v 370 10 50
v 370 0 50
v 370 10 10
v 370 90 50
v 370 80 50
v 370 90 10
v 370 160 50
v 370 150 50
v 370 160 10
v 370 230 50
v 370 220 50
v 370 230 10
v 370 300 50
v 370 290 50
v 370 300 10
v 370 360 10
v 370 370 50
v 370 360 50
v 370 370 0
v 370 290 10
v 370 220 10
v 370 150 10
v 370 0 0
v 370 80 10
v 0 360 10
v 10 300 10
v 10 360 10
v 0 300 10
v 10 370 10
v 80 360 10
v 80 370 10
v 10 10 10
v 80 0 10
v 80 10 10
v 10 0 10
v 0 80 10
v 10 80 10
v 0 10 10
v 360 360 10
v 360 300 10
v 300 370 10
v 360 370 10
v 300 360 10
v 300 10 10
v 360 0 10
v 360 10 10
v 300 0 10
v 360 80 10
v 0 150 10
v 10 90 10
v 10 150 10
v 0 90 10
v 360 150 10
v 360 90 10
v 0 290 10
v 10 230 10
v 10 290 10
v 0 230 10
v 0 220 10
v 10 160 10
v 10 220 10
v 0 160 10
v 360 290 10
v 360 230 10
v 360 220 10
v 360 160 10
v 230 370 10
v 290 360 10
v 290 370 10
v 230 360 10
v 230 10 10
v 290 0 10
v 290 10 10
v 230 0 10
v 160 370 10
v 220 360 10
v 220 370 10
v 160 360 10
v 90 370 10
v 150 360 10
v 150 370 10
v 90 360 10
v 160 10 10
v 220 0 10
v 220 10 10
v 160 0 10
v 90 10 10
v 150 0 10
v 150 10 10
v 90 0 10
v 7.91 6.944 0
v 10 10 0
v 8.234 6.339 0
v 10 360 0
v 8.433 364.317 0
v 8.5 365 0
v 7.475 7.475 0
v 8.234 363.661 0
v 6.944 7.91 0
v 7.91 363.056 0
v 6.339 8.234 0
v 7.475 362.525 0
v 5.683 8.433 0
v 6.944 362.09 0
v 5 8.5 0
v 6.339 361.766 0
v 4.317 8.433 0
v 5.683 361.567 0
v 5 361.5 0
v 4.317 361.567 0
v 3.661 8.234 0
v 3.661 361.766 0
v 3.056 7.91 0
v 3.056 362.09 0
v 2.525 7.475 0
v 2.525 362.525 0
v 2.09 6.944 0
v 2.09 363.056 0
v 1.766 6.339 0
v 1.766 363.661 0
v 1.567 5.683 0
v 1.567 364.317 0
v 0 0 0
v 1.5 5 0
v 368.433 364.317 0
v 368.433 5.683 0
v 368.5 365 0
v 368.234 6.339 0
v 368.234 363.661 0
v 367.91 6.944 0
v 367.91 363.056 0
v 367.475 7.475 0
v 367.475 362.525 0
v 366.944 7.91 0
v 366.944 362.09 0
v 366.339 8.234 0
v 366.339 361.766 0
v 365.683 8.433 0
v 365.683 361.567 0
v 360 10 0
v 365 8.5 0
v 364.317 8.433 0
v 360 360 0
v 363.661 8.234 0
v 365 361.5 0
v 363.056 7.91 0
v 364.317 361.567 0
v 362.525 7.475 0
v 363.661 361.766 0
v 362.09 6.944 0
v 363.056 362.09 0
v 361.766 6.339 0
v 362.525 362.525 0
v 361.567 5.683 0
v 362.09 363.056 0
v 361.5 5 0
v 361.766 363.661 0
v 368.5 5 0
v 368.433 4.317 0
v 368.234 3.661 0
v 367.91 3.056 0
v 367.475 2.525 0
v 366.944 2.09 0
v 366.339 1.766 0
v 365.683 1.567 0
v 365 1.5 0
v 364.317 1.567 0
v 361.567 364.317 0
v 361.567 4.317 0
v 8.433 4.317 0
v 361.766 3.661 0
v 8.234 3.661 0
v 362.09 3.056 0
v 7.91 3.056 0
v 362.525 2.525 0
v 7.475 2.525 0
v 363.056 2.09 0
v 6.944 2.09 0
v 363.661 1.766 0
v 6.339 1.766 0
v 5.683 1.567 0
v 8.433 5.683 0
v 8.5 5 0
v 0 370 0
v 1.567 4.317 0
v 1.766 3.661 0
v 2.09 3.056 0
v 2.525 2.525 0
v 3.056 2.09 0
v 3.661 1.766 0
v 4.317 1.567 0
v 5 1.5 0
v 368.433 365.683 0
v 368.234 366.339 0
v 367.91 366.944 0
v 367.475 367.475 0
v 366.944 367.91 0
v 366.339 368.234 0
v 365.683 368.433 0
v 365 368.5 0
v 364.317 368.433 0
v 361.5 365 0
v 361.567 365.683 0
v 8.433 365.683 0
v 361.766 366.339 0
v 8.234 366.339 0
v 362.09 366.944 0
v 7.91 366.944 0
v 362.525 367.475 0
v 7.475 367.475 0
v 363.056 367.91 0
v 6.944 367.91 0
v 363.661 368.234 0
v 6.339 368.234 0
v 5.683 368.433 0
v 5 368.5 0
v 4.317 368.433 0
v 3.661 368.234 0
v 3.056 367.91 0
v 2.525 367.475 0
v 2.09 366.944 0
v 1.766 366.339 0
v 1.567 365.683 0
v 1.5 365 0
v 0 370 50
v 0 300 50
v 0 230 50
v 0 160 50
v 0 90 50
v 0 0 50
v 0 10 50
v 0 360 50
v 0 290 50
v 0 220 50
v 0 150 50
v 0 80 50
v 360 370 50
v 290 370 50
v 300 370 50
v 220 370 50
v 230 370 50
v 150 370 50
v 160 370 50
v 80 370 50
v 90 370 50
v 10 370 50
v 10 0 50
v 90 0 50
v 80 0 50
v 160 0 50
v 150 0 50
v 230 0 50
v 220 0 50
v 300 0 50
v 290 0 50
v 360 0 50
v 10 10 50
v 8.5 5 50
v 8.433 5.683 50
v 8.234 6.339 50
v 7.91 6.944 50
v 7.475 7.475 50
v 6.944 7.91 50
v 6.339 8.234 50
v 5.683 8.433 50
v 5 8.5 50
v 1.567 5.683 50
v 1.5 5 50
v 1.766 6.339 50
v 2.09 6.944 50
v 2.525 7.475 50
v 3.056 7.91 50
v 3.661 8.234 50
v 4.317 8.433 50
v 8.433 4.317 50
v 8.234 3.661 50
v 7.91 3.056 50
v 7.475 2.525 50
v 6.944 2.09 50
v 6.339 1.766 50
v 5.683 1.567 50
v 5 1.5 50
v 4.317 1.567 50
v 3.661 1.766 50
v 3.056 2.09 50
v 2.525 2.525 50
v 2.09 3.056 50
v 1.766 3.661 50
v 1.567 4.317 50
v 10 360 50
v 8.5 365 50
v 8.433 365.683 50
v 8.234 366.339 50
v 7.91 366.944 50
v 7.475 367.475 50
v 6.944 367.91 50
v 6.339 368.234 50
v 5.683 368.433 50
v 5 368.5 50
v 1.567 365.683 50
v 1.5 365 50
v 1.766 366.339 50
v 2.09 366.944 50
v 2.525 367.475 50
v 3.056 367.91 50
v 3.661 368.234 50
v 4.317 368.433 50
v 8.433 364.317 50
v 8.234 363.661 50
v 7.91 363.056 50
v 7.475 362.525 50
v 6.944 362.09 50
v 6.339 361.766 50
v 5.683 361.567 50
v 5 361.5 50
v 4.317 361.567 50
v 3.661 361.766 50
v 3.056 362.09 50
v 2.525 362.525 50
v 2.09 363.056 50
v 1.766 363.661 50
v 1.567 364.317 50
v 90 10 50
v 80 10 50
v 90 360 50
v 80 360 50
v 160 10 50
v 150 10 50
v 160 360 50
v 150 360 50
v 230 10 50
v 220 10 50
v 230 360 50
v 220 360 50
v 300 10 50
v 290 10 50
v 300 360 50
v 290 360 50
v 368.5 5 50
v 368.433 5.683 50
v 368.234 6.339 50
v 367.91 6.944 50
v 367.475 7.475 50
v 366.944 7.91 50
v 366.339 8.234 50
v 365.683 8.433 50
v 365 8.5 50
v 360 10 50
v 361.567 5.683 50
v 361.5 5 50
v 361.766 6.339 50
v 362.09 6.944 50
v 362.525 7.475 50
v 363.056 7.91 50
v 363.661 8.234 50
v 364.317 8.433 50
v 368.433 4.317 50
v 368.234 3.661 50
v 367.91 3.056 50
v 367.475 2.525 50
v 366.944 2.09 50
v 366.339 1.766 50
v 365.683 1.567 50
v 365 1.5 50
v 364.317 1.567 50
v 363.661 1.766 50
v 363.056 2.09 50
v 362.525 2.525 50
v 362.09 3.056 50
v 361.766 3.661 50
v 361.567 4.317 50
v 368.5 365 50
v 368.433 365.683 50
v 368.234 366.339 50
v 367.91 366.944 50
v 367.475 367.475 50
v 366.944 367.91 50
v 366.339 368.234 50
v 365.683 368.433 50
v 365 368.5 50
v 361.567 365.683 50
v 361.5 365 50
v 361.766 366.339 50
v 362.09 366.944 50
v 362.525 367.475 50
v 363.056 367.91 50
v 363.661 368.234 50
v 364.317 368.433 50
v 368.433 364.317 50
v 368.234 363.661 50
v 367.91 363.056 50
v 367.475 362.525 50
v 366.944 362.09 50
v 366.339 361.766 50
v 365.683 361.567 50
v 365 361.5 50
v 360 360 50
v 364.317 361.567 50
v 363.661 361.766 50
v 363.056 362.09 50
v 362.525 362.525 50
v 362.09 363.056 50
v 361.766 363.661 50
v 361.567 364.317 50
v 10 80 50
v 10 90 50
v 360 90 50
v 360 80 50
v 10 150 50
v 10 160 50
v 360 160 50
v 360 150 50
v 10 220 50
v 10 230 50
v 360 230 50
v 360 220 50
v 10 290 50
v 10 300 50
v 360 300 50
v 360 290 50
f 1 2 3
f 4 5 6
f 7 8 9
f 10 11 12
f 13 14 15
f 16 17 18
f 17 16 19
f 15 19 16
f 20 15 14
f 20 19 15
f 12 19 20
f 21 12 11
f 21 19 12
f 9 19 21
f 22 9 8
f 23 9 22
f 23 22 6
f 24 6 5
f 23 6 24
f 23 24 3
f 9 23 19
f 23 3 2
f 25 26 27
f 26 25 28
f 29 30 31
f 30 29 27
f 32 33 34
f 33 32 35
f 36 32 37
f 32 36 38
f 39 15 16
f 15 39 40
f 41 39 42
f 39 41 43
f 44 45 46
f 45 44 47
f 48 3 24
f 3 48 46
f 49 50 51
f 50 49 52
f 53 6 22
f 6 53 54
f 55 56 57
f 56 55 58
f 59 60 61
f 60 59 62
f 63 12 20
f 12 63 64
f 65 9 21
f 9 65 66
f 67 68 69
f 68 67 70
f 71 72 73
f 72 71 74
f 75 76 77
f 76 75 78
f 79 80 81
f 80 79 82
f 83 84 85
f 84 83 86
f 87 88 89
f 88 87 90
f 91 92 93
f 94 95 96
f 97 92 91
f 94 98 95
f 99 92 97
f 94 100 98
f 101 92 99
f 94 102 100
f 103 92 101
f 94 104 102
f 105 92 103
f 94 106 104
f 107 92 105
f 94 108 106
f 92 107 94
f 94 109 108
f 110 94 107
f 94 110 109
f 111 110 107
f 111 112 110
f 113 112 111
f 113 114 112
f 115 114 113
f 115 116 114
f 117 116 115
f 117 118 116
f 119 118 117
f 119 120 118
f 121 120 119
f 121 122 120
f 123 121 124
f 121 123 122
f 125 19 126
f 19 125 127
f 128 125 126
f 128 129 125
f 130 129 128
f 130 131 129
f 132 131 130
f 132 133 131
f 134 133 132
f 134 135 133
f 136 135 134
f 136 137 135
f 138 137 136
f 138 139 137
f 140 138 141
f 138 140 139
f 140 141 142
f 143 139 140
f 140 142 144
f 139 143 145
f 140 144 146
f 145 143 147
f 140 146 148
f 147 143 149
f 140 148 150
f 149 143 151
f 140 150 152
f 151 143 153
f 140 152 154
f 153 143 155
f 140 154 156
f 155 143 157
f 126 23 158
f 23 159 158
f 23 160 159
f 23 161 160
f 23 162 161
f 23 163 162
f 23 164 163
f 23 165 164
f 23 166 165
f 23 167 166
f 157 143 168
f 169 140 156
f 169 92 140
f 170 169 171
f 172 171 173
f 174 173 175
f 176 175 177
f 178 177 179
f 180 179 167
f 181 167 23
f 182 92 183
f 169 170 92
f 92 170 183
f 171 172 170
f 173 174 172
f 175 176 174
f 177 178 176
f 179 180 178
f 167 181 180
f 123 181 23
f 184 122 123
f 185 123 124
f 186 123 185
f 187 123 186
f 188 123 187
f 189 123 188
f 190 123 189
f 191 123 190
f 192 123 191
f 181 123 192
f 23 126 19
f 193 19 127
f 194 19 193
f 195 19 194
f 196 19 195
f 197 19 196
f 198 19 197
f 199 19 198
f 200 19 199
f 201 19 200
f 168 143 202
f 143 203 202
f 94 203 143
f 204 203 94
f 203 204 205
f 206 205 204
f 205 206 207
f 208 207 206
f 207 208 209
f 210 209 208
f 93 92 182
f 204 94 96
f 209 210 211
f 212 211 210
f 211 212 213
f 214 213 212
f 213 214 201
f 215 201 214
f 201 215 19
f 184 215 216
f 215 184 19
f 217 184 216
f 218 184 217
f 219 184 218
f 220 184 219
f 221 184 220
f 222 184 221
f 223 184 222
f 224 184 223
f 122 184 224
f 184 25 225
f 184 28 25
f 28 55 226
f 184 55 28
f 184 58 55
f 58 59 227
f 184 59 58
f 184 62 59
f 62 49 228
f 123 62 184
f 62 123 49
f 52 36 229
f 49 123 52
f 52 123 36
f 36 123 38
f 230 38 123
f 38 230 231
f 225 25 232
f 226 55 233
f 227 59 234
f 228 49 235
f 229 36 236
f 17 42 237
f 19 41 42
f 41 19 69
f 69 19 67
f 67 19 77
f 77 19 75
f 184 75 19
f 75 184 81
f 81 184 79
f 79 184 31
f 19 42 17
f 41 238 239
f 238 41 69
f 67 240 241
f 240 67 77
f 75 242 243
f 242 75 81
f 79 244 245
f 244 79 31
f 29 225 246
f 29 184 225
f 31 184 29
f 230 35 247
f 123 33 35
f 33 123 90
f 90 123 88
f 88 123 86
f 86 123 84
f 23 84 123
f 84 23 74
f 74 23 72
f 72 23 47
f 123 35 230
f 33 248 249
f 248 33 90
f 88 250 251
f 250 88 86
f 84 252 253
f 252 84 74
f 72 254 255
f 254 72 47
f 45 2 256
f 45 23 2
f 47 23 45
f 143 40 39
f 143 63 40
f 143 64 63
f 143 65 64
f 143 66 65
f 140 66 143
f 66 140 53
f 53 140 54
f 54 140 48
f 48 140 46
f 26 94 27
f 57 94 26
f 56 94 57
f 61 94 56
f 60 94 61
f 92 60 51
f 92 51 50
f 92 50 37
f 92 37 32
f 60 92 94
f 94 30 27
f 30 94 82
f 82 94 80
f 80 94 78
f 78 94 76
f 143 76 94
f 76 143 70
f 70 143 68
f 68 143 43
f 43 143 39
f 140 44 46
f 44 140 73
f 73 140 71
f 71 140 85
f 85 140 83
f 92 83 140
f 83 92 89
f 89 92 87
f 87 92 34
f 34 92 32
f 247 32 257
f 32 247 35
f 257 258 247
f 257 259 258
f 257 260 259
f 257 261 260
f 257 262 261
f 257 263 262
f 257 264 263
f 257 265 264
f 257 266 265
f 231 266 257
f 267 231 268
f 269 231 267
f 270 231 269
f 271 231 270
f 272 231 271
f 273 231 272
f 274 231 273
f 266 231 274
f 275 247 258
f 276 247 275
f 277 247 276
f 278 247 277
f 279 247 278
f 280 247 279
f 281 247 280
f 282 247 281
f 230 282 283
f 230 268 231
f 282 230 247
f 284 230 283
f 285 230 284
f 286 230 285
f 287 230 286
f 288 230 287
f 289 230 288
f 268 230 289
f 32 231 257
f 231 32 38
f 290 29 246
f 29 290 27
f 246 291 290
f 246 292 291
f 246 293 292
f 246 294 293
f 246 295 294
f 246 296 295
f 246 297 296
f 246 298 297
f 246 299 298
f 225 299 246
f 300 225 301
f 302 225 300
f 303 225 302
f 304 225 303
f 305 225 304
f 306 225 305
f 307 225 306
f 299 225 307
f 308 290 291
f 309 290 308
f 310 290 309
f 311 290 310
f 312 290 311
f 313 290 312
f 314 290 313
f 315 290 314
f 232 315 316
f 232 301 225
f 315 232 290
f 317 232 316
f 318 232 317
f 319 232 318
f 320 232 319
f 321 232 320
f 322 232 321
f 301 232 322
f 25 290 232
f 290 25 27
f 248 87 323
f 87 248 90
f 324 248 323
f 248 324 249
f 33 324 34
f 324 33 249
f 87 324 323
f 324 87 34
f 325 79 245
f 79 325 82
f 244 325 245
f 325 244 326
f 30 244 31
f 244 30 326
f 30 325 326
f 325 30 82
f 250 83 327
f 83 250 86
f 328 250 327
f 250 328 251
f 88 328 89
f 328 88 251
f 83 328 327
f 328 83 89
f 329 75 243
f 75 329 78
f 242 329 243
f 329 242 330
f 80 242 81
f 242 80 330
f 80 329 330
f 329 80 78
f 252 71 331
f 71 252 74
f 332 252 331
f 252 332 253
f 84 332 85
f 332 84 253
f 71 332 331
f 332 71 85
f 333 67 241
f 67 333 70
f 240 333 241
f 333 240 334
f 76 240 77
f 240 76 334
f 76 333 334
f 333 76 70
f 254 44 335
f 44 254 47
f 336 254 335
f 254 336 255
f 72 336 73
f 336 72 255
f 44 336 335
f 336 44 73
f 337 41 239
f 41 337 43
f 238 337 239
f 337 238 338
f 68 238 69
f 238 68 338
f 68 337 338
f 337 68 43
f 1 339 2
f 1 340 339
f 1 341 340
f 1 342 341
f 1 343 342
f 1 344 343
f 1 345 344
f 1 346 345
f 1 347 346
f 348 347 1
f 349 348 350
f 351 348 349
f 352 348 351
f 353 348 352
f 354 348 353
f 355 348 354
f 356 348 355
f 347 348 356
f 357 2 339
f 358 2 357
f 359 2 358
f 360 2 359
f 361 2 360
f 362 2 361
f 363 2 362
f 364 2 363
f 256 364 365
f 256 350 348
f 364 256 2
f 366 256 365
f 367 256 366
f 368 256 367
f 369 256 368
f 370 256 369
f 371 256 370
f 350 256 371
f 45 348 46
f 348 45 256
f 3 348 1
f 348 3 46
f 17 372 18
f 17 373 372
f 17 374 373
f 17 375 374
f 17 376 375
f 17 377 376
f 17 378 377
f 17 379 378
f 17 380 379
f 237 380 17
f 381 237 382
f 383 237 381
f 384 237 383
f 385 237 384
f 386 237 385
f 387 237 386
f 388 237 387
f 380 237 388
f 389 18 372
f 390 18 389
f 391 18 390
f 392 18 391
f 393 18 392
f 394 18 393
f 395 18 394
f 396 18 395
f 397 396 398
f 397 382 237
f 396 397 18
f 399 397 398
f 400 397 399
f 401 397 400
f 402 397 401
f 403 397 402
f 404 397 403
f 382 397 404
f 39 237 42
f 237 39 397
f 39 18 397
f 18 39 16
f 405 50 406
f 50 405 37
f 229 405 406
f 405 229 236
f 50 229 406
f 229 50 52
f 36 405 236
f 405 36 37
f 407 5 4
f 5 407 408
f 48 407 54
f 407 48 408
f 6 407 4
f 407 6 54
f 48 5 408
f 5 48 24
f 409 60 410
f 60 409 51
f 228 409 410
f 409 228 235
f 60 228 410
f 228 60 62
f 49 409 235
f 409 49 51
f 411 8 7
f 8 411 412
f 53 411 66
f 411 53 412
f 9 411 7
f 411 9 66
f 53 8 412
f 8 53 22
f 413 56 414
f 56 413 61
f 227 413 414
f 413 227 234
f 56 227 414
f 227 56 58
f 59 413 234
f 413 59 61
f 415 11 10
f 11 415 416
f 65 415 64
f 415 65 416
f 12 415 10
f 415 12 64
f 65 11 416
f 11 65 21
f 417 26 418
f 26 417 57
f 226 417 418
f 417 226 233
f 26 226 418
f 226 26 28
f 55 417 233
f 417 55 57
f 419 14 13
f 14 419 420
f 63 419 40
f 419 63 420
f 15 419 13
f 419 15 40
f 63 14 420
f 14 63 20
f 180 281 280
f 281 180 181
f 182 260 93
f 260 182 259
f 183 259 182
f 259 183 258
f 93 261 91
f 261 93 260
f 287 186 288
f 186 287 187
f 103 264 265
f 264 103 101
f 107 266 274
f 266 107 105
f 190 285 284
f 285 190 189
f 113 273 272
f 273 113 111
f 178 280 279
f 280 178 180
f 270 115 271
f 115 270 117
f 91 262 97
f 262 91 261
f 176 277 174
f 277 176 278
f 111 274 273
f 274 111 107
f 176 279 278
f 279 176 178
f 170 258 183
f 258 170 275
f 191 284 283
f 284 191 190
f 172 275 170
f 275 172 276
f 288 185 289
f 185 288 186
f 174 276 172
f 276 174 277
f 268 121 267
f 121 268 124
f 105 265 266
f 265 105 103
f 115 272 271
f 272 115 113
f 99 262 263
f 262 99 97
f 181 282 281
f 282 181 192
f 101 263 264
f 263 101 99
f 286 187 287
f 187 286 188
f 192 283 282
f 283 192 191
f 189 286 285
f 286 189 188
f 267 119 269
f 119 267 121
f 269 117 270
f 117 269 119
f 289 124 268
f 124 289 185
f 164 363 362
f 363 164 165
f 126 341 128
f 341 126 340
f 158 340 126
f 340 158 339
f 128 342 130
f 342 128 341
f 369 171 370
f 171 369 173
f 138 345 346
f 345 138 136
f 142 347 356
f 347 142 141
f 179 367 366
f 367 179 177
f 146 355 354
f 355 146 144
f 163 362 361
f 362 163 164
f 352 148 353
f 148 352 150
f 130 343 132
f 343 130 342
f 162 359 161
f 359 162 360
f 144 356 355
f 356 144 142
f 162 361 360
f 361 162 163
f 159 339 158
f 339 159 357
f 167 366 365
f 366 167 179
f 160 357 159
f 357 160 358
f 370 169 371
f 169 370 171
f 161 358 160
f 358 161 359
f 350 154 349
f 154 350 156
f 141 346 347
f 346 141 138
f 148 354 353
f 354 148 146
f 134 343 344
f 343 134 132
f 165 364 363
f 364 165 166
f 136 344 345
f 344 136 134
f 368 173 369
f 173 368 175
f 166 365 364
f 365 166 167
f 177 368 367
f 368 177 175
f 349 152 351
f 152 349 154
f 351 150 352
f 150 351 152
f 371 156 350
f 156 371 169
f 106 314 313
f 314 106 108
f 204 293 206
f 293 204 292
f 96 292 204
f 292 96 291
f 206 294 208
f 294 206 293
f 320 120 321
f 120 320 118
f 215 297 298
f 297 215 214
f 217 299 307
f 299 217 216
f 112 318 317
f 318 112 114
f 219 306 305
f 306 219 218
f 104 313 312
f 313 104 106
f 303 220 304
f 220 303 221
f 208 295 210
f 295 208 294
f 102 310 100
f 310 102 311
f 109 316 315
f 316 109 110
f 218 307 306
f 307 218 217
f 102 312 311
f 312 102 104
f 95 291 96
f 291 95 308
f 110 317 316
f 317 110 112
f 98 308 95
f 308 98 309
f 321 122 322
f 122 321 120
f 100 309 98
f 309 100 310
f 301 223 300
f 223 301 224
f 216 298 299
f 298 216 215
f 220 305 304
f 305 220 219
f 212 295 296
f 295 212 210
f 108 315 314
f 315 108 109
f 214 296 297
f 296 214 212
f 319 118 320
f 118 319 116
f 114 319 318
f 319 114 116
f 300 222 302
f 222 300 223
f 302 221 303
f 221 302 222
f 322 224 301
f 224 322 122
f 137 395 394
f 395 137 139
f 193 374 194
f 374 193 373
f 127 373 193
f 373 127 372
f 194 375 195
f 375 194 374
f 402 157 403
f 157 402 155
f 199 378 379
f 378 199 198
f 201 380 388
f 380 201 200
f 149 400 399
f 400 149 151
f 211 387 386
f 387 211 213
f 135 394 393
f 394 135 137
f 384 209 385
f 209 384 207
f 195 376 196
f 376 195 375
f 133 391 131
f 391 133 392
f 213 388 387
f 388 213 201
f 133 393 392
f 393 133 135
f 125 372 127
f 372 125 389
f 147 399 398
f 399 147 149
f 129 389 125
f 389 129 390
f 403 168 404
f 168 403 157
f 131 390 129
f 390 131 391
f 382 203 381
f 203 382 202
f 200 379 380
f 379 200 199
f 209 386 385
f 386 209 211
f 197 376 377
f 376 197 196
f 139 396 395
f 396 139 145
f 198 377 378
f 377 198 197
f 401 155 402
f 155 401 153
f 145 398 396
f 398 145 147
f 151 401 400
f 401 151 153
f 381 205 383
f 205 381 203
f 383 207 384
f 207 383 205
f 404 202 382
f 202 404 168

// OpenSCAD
bar=10;ext=370;int_size=350;h_bar_h=10;v_bar_h=40;m6_d=7;positions=[0,80,150,220,290,360];difference(){union(){difference(){cube([ext,ext,h_bar_h]);translate([bar,bar,-1])cube([int_size,int_size,h_bar_h+2]);}for(x=positions){translate([x,0,h_bar_h])cube([bar,bar,v_bar_h]);translate([x,360,h_bar_h])cube([bar,bar,v_bar_h]);}for(y=positions){if(y!=0&&y!=360){translate([0,y,h_bar_h])cube([bar,bar,v_bar_h]);translate([360,y,h_bar_h])cube([bar,bar,v_bar_h]);}}}translate([5,5,-1])cylinder(h=100,d=m6_d,$fn=32);translate([365,5,-1])cylinder(h=100,d=m6_d,$fn=32);translate([5,365,-1])cylinder(h=100,d=m6_d,$fn=32);translate([365,365,-1])cylinder(h=100,d=m6_d,$fn=32);}
